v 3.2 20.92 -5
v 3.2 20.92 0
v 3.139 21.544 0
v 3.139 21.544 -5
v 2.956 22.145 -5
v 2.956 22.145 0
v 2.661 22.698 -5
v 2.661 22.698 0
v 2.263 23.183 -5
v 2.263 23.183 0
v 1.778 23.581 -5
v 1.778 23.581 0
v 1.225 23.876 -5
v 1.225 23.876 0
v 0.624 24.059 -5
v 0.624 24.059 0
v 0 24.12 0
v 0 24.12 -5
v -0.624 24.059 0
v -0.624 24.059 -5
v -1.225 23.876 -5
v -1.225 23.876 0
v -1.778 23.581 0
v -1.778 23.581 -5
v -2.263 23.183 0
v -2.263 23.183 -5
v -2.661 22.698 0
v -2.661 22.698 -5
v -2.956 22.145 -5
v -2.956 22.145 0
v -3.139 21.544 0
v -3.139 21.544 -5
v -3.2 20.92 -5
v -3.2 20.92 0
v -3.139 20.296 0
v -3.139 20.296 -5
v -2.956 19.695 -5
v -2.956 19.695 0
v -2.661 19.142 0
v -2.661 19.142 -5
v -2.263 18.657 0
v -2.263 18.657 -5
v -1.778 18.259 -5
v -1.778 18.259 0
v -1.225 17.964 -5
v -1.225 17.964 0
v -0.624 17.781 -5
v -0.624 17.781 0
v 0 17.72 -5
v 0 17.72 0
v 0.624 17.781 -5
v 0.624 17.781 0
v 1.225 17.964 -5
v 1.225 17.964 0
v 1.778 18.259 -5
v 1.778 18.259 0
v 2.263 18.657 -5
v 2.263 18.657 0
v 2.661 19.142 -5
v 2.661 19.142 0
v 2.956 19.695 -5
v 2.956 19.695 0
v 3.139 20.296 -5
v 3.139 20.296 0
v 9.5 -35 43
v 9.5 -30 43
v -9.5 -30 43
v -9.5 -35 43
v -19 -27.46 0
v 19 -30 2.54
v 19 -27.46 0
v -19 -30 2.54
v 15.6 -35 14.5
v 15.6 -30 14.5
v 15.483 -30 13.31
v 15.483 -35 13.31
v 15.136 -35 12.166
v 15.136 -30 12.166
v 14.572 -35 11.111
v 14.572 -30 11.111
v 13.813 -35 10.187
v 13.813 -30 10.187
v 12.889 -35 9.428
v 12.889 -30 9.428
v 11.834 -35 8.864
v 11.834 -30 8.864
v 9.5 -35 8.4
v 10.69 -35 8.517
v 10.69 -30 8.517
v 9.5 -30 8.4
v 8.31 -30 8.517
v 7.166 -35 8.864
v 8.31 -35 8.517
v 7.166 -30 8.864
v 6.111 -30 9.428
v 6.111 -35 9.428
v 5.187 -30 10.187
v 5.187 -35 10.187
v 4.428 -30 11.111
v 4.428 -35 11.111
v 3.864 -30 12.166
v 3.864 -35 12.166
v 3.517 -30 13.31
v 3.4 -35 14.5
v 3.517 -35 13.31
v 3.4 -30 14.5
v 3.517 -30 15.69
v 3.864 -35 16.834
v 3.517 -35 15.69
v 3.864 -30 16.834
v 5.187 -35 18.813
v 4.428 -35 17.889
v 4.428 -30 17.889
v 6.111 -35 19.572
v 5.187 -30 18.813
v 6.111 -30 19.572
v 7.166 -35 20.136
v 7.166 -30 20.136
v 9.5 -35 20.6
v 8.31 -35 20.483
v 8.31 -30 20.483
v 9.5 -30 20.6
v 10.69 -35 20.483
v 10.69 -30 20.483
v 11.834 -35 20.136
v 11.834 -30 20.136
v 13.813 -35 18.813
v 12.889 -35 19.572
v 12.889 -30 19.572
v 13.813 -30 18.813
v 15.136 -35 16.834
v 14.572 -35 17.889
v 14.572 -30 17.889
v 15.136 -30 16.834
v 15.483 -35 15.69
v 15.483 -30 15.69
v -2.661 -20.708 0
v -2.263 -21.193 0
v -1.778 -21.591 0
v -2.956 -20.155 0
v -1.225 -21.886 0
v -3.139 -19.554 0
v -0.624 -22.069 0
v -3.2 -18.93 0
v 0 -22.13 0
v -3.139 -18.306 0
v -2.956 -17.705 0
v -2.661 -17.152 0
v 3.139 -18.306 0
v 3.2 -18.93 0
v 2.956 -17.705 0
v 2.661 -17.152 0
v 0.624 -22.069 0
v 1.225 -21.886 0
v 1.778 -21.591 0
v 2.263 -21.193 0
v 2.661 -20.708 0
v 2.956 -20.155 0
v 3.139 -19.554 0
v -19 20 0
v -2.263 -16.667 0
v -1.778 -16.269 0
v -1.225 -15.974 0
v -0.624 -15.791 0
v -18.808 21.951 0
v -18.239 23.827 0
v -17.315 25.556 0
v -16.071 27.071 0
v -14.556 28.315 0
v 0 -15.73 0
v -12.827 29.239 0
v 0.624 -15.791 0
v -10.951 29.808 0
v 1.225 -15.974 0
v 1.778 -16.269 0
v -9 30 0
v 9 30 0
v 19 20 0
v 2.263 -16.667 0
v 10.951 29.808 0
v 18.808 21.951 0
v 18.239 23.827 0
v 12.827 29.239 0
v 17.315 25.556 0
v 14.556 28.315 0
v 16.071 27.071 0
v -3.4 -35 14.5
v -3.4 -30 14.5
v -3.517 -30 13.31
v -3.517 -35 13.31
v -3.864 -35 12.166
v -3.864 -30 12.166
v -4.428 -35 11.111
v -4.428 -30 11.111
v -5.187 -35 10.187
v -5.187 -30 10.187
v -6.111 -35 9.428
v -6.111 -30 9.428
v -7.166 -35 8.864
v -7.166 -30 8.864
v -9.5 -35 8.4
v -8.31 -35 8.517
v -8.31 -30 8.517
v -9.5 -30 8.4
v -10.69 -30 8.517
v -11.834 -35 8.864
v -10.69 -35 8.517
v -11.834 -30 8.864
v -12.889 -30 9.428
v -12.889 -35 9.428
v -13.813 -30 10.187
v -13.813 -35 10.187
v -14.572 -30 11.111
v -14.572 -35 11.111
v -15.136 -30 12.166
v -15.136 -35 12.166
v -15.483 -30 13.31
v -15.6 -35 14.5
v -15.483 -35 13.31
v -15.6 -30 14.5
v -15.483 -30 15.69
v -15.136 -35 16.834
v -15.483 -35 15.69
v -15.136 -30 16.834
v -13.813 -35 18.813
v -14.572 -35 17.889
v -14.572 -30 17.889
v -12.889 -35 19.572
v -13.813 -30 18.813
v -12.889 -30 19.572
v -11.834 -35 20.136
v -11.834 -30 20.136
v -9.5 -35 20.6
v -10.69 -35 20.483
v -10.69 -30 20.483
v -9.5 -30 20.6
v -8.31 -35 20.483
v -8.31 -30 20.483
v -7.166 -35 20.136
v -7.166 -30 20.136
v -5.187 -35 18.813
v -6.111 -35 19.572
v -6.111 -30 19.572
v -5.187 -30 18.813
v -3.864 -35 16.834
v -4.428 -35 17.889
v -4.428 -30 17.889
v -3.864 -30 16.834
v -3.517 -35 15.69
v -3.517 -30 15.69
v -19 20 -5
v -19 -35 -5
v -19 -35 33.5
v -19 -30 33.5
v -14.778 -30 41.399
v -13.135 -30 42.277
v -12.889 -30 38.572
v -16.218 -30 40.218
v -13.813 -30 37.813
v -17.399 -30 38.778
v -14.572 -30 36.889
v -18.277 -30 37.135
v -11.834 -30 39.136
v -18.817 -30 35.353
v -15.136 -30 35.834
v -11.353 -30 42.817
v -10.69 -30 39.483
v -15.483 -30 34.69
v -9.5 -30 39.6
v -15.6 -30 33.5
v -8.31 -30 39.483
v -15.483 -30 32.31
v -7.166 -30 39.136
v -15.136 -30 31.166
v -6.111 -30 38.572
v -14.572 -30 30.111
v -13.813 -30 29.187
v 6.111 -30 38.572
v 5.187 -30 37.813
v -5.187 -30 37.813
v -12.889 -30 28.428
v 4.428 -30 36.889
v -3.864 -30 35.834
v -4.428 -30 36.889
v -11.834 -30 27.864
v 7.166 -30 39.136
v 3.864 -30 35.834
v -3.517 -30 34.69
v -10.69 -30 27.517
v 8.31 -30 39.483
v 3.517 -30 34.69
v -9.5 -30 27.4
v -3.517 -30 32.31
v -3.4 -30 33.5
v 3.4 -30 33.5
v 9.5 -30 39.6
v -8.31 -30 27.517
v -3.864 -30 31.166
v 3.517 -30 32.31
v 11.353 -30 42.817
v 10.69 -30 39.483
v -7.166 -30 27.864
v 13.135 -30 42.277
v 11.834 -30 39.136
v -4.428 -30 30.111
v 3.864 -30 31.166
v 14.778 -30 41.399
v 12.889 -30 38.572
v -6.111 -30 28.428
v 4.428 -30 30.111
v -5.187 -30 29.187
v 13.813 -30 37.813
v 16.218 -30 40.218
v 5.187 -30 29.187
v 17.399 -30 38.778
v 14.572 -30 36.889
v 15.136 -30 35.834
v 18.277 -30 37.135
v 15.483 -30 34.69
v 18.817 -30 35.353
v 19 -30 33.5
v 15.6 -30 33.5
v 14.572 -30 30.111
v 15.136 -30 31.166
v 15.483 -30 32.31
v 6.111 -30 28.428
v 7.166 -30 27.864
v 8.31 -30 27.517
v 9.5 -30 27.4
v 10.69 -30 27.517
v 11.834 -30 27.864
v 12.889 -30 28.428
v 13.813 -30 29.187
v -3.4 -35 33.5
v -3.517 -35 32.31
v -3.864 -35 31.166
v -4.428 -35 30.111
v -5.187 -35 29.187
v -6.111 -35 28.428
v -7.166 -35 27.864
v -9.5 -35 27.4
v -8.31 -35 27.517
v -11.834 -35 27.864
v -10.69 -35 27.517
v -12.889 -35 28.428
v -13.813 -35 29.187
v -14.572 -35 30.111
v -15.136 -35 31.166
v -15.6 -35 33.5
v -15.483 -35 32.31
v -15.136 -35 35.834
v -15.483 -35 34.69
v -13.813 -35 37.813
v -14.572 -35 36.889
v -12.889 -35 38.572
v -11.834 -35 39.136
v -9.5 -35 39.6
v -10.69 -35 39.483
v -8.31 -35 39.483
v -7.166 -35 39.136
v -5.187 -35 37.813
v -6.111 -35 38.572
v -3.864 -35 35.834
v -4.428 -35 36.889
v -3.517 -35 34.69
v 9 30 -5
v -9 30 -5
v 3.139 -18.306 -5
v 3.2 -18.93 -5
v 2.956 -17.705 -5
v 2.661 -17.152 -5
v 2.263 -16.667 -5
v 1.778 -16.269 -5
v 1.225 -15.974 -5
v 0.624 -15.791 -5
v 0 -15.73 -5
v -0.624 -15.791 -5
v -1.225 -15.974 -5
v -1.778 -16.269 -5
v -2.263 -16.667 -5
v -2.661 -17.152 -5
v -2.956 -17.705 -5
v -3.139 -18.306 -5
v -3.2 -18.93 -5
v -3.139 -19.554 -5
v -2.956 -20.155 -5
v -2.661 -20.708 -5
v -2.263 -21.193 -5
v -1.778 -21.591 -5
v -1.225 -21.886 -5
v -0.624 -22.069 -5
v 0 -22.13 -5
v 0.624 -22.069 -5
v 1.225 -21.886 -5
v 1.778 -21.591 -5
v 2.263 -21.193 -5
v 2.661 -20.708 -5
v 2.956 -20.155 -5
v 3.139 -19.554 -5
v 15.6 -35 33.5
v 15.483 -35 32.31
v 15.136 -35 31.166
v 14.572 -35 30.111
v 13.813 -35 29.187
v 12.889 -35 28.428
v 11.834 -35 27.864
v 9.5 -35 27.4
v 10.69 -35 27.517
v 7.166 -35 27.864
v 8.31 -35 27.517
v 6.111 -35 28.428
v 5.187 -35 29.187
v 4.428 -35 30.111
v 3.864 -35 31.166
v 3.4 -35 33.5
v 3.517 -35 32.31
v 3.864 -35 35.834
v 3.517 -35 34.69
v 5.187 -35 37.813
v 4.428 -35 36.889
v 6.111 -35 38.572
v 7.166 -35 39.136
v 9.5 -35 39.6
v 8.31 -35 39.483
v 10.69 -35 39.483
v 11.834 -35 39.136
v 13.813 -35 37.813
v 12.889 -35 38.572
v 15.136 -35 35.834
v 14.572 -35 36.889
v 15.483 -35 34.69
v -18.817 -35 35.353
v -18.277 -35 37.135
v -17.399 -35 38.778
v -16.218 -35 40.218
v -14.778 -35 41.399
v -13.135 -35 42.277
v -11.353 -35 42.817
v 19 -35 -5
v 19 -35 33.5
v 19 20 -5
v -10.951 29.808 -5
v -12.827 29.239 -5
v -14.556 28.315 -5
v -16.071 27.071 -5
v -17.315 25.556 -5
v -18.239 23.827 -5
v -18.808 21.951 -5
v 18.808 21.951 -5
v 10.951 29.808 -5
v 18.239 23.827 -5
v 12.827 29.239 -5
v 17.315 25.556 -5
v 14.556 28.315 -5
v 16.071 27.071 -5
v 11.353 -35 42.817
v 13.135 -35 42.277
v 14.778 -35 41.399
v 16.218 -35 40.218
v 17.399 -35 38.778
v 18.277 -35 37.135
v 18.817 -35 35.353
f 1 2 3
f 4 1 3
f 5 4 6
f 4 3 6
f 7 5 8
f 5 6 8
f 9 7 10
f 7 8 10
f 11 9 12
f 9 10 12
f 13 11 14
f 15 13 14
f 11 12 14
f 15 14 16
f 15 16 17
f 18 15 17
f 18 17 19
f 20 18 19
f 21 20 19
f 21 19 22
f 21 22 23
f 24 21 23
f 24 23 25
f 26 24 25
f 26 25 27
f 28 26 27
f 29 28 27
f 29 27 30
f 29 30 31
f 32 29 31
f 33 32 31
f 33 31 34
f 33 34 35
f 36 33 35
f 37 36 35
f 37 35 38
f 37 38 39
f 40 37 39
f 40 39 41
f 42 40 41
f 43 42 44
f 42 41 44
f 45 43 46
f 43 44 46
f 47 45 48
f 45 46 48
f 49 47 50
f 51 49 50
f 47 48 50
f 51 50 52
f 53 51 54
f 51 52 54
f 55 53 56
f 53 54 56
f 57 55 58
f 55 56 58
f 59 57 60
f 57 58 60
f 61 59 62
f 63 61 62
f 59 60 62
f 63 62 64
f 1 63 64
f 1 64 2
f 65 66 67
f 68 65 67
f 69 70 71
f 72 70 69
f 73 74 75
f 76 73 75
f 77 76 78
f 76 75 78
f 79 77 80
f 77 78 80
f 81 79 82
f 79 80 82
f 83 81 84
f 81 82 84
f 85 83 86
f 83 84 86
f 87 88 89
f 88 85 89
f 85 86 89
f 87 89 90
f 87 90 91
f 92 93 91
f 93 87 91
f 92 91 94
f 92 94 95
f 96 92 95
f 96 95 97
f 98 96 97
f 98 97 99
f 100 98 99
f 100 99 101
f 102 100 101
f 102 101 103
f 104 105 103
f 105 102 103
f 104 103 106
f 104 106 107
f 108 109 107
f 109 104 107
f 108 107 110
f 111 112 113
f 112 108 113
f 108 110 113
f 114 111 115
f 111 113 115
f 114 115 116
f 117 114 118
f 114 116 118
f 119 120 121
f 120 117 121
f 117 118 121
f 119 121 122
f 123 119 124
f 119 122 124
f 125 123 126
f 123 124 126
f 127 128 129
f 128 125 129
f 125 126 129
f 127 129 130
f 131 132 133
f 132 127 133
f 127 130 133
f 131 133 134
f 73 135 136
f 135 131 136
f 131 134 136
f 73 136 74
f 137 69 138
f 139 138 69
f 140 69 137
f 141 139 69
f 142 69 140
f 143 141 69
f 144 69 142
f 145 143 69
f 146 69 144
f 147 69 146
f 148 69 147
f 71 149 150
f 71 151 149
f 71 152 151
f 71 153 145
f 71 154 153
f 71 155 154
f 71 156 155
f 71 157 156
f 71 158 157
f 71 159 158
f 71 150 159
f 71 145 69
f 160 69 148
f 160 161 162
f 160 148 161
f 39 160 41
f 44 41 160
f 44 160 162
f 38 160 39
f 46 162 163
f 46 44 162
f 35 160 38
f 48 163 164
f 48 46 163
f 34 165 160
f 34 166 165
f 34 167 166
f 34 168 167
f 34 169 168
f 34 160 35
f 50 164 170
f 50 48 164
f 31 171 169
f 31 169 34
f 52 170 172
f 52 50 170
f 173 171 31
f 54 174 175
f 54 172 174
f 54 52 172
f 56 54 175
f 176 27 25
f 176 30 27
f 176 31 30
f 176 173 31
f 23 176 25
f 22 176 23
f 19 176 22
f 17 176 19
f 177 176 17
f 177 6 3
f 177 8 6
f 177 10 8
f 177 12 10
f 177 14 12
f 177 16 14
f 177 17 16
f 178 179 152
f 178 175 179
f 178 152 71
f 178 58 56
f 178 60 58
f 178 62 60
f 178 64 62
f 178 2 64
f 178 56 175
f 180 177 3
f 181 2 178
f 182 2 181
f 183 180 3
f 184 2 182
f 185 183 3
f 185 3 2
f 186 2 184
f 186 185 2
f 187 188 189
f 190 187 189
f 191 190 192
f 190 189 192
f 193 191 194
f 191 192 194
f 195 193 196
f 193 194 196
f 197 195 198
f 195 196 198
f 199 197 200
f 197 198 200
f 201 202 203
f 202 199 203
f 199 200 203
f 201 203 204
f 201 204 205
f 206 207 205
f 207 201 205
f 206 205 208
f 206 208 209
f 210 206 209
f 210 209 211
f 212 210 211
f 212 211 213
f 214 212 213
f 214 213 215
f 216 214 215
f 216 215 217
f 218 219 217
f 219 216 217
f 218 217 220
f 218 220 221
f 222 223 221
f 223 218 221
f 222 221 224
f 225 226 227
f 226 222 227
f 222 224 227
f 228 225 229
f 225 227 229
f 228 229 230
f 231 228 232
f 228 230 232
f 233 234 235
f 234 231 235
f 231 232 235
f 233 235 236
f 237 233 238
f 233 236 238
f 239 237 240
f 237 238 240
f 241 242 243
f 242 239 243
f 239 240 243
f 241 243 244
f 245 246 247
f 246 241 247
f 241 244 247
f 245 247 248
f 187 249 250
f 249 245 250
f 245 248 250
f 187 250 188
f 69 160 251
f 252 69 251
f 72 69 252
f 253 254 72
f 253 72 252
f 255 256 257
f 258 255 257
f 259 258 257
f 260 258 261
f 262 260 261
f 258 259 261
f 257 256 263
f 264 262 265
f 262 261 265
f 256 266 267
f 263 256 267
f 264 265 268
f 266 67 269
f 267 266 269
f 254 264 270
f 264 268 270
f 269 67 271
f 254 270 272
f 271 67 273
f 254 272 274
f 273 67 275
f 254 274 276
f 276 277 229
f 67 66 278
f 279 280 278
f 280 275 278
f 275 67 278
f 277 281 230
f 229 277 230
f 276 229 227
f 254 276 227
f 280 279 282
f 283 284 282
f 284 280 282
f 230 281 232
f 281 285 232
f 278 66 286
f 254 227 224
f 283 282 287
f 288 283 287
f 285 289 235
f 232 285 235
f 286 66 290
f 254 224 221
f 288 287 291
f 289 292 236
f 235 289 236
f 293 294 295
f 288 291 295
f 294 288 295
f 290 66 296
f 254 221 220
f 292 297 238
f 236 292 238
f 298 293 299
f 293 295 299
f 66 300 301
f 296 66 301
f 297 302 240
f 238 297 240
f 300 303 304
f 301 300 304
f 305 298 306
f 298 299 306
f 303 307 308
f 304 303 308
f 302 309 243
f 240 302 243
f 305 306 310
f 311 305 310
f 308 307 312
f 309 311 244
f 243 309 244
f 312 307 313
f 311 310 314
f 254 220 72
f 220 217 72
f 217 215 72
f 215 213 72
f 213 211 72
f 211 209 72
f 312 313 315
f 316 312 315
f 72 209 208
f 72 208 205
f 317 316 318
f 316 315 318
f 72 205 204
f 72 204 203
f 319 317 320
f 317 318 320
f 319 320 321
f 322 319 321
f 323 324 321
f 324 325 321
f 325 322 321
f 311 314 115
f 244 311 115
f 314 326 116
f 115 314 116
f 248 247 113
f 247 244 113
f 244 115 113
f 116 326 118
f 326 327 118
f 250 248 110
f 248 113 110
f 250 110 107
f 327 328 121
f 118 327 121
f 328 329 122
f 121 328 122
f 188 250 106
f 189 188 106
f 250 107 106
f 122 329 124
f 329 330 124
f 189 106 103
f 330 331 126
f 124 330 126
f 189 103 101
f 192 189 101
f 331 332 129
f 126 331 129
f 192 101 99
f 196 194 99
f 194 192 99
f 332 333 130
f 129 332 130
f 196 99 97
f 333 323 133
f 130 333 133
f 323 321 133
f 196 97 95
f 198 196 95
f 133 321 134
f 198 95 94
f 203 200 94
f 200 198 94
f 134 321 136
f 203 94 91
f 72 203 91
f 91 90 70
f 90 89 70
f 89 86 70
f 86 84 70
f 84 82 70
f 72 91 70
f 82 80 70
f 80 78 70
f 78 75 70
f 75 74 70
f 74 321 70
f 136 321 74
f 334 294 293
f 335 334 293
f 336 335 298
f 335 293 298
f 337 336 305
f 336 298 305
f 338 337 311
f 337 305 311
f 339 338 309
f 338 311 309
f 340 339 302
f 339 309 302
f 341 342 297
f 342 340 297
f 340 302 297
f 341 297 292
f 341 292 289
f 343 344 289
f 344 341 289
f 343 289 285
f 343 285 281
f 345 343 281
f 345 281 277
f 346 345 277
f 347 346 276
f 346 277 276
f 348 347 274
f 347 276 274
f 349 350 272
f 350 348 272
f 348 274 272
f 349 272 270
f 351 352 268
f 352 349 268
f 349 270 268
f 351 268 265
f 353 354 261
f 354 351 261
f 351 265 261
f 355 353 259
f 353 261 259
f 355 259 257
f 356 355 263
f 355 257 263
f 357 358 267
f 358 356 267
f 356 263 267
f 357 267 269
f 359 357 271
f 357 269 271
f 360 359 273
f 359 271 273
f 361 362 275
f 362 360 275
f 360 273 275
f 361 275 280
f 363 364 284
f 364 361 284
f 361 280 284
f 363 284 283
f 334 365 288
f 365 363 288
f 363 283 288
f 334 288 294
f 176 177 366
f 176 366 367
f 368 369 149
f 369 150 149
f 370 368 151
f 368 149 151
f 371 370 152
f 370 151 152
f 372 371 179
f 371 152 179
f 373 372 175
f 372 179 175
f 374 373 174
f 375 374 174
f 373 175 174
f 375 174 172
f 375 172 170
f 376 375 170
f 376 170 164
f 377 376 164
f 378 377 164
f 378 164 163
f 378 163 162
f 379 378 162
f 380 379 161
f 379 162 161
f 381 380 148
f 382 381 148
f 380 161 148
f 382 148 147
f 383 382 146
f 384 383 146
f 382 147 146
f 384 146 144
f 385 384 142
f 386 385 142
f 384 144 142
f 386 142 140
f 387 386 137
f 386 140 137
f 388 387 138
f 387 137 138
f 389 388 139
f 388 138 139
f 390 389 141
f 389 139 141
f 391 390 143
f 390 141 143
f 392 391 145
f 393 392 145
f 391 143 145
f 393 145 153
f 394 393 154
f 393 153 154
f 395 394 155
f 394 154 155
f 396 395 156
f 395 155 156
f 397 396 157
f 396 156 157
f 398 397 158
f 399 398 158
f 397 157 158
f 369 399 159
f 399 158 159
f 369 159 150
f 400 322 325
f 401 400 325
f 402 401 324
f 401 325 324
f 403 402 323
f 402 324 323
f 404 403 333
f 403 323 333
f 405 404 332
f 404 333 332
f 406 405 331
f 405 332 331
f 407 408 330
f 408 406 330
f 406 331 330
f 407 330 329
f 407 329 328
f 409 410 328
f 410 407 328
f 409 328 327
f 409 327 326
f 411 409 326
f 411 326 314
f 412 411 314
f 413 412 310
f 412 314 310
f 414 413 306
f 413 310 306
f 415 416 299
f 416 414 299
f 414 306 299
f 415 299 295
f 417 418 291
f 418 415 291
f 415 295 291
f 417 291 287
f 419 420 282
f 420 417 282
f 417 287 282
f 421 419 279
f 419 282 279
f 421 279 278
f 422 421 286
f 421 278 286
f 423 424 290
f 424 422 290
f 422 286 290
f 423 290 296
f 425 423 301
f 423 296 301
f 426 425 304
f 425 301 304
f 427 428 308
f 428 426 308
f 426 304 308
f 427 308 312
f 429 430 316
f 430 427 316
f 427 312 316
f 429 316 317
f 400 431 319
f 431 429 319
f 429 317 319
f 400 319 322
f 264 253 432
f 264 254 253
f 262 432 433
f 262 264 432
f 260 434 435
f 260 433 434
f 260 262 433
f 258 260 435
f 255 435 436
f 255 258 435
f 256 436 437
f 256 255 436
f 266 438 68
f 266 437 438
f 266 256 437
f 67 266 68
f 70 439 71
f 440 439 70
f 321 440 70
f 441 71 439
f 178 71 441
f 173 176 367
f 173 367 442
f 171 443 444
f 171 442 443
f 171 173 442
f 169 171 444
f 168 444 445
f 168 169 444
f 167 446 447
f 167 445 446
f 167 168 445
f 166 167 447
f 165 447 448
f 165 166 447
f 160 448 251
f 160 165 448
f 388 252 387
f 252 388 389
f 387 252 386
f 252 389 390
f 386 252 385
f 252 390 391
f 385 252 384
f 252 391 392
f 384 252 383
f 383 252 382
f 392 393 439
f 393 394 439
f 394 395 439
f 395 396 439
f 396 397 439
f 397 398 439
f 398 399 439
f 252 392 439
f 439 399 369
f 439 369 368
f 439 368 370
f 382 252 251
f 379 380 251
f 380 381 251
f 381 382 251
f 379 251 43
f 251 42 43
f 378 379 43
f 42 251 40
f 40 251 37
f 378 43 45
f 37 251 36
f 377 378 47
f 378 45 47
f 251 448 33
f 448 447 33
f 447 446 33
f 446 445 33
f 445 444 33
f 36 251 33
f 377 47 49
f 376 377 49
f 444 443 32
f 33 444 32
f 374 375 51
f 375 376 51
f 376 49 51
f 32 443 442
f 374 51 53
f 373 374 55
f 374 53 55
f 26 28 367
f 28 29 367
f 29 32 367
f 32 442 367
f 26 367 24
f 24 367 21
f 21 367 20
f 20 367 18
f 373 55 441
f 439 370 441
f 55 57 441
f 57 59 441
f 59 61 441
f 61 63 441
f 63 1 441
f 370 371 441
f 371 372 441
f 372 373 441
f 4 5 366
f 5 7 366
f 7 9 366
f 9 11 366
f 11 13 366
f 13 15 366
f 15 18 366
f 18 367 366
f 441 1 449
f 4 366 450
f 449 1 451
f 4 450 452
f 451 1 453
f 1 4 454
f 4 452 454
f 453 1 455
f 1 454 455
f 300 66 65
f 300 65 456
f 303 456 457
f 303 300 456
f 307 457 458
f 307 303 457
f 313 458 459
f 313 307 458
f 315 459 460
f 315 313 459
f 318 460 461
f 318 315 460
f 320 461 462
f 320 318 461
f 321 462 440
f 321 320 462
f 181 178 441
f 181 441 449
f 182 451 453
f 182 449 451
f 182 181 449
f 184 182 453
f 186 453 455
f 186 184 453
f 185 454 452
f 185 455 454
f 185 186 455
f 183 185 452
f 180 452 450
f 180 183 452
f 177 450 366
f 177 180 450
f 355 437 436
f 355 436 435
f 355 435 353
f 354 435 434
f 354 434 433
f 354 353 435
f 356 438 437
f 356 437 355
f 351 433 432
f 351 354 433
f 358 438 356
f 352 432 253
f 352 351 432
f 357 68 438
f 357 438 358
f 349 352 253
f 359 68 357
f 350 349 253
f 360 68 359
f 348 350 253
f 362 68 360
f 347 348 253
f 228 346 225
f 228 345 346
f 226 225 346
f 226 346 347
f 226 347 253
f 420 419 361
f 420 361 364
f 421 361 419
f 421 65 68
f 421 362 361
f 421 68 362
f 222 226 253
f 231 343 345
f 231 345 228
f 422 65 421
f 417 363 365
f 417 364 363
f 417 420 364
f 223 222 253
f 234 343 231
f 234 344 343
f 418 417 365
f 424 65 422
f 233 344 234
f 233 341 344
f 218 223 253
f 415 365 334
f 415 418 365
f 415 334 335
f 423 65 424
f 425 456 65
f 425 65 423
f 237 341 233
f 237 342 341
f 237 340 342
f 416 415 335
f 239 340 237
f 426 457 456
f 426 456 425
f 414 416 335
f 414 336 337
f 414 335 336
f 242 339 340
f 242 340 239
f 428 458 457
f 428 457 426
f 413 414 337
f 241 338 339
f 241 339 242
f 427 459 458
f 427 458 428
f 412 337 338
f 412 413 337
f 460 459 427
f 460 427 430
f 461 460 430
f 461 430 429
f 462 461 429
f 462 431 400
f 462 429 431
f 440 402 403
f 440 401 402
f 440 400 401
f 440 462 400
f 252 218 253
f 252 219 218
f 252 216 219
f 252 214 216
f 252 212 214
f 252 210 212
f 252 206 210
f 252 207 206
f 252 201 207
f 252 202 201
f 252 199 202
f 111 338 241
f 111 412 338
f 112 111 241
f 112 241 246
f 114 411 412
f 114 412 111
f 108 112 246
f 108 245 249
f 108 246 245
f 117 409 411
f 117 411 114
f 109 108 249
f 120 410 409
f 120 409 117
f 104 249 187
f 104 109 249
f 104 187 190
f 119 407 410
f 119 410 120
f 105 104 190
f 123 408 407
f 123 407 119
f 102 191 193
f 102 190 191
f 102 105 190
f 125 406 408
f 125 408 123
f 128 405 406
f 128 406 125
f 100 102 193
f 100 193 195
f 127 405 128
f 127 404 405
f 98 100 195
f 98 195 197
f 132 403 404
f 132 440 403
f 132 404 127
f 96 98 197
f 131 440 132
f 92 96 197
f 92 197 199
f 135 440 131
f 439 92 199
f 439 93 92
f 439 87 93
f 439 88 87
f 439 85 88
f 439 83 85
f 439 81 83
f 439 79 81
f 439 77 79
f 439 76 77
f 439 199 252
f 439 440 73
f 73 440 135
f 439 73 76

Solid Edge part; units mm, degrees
sketch "Sketch1" plane through (0, 0, 0) normal (0, 0, 1) x (1, 0, 0)
  circle A0 centre (0, -18.93) radius 3.2
  circle A1 centre (0, 20.92) radius 3.2
  line L0 (9, 30) -> (-9, 30)
  arc A2 (-19, 20) -> (-9, 30) centre (-9, 20) cw
  line L1 (-19, 20) -> (-19, -30)
  line L2 (-19, -30) -> (19, -30)
  line L3 (19, -30) -> (19, 20)
  arc A3 (9, 30) -> (19, 20) centre (9, 20) cw
extrude "Protrusion1" add sketch "Sketch1" against normal blind 5
sketch "Sketch2" plane through (0, -30, -2.5) normal (0, -1, 0) x (1, 0, 0)
  circle A0 centre (-9.5, 36) radius 6.1
  circle A1 centre (-9.5, 17) radius 6.1
  circle A2 centre (9.5, 17) radius 6.1
  circle A3 centre (9.5, 36) radius 6.1
  line L0 (9.5, 45.5) -> (-9.5, 45.5)
  arc A4 (-9.5, 45.5) -> (-19, 36) centre (-9.5, 36) ccw
  line L1 (-19, 36) -> (-19, 7.5)
  line L2 (-19, 7.5) -> (-19, -2.5)
  line L3 (-19, -2.5) -> (19, -2.5)
  line L4 (19, -2.5) -> (19, 7.5)
  line L5 (19, 7.5) -> (19, 36)
  arc A5 (9.5, 45.5) -> (19, 36) centre (9.5, 36) cw
extrude "Extrusionsausprägung_2" add sketch "Sketch2" along normal blind 5
chamfer "Fase_1" distance 2.54 angle 45 1 edges at (0, -30, 0)
